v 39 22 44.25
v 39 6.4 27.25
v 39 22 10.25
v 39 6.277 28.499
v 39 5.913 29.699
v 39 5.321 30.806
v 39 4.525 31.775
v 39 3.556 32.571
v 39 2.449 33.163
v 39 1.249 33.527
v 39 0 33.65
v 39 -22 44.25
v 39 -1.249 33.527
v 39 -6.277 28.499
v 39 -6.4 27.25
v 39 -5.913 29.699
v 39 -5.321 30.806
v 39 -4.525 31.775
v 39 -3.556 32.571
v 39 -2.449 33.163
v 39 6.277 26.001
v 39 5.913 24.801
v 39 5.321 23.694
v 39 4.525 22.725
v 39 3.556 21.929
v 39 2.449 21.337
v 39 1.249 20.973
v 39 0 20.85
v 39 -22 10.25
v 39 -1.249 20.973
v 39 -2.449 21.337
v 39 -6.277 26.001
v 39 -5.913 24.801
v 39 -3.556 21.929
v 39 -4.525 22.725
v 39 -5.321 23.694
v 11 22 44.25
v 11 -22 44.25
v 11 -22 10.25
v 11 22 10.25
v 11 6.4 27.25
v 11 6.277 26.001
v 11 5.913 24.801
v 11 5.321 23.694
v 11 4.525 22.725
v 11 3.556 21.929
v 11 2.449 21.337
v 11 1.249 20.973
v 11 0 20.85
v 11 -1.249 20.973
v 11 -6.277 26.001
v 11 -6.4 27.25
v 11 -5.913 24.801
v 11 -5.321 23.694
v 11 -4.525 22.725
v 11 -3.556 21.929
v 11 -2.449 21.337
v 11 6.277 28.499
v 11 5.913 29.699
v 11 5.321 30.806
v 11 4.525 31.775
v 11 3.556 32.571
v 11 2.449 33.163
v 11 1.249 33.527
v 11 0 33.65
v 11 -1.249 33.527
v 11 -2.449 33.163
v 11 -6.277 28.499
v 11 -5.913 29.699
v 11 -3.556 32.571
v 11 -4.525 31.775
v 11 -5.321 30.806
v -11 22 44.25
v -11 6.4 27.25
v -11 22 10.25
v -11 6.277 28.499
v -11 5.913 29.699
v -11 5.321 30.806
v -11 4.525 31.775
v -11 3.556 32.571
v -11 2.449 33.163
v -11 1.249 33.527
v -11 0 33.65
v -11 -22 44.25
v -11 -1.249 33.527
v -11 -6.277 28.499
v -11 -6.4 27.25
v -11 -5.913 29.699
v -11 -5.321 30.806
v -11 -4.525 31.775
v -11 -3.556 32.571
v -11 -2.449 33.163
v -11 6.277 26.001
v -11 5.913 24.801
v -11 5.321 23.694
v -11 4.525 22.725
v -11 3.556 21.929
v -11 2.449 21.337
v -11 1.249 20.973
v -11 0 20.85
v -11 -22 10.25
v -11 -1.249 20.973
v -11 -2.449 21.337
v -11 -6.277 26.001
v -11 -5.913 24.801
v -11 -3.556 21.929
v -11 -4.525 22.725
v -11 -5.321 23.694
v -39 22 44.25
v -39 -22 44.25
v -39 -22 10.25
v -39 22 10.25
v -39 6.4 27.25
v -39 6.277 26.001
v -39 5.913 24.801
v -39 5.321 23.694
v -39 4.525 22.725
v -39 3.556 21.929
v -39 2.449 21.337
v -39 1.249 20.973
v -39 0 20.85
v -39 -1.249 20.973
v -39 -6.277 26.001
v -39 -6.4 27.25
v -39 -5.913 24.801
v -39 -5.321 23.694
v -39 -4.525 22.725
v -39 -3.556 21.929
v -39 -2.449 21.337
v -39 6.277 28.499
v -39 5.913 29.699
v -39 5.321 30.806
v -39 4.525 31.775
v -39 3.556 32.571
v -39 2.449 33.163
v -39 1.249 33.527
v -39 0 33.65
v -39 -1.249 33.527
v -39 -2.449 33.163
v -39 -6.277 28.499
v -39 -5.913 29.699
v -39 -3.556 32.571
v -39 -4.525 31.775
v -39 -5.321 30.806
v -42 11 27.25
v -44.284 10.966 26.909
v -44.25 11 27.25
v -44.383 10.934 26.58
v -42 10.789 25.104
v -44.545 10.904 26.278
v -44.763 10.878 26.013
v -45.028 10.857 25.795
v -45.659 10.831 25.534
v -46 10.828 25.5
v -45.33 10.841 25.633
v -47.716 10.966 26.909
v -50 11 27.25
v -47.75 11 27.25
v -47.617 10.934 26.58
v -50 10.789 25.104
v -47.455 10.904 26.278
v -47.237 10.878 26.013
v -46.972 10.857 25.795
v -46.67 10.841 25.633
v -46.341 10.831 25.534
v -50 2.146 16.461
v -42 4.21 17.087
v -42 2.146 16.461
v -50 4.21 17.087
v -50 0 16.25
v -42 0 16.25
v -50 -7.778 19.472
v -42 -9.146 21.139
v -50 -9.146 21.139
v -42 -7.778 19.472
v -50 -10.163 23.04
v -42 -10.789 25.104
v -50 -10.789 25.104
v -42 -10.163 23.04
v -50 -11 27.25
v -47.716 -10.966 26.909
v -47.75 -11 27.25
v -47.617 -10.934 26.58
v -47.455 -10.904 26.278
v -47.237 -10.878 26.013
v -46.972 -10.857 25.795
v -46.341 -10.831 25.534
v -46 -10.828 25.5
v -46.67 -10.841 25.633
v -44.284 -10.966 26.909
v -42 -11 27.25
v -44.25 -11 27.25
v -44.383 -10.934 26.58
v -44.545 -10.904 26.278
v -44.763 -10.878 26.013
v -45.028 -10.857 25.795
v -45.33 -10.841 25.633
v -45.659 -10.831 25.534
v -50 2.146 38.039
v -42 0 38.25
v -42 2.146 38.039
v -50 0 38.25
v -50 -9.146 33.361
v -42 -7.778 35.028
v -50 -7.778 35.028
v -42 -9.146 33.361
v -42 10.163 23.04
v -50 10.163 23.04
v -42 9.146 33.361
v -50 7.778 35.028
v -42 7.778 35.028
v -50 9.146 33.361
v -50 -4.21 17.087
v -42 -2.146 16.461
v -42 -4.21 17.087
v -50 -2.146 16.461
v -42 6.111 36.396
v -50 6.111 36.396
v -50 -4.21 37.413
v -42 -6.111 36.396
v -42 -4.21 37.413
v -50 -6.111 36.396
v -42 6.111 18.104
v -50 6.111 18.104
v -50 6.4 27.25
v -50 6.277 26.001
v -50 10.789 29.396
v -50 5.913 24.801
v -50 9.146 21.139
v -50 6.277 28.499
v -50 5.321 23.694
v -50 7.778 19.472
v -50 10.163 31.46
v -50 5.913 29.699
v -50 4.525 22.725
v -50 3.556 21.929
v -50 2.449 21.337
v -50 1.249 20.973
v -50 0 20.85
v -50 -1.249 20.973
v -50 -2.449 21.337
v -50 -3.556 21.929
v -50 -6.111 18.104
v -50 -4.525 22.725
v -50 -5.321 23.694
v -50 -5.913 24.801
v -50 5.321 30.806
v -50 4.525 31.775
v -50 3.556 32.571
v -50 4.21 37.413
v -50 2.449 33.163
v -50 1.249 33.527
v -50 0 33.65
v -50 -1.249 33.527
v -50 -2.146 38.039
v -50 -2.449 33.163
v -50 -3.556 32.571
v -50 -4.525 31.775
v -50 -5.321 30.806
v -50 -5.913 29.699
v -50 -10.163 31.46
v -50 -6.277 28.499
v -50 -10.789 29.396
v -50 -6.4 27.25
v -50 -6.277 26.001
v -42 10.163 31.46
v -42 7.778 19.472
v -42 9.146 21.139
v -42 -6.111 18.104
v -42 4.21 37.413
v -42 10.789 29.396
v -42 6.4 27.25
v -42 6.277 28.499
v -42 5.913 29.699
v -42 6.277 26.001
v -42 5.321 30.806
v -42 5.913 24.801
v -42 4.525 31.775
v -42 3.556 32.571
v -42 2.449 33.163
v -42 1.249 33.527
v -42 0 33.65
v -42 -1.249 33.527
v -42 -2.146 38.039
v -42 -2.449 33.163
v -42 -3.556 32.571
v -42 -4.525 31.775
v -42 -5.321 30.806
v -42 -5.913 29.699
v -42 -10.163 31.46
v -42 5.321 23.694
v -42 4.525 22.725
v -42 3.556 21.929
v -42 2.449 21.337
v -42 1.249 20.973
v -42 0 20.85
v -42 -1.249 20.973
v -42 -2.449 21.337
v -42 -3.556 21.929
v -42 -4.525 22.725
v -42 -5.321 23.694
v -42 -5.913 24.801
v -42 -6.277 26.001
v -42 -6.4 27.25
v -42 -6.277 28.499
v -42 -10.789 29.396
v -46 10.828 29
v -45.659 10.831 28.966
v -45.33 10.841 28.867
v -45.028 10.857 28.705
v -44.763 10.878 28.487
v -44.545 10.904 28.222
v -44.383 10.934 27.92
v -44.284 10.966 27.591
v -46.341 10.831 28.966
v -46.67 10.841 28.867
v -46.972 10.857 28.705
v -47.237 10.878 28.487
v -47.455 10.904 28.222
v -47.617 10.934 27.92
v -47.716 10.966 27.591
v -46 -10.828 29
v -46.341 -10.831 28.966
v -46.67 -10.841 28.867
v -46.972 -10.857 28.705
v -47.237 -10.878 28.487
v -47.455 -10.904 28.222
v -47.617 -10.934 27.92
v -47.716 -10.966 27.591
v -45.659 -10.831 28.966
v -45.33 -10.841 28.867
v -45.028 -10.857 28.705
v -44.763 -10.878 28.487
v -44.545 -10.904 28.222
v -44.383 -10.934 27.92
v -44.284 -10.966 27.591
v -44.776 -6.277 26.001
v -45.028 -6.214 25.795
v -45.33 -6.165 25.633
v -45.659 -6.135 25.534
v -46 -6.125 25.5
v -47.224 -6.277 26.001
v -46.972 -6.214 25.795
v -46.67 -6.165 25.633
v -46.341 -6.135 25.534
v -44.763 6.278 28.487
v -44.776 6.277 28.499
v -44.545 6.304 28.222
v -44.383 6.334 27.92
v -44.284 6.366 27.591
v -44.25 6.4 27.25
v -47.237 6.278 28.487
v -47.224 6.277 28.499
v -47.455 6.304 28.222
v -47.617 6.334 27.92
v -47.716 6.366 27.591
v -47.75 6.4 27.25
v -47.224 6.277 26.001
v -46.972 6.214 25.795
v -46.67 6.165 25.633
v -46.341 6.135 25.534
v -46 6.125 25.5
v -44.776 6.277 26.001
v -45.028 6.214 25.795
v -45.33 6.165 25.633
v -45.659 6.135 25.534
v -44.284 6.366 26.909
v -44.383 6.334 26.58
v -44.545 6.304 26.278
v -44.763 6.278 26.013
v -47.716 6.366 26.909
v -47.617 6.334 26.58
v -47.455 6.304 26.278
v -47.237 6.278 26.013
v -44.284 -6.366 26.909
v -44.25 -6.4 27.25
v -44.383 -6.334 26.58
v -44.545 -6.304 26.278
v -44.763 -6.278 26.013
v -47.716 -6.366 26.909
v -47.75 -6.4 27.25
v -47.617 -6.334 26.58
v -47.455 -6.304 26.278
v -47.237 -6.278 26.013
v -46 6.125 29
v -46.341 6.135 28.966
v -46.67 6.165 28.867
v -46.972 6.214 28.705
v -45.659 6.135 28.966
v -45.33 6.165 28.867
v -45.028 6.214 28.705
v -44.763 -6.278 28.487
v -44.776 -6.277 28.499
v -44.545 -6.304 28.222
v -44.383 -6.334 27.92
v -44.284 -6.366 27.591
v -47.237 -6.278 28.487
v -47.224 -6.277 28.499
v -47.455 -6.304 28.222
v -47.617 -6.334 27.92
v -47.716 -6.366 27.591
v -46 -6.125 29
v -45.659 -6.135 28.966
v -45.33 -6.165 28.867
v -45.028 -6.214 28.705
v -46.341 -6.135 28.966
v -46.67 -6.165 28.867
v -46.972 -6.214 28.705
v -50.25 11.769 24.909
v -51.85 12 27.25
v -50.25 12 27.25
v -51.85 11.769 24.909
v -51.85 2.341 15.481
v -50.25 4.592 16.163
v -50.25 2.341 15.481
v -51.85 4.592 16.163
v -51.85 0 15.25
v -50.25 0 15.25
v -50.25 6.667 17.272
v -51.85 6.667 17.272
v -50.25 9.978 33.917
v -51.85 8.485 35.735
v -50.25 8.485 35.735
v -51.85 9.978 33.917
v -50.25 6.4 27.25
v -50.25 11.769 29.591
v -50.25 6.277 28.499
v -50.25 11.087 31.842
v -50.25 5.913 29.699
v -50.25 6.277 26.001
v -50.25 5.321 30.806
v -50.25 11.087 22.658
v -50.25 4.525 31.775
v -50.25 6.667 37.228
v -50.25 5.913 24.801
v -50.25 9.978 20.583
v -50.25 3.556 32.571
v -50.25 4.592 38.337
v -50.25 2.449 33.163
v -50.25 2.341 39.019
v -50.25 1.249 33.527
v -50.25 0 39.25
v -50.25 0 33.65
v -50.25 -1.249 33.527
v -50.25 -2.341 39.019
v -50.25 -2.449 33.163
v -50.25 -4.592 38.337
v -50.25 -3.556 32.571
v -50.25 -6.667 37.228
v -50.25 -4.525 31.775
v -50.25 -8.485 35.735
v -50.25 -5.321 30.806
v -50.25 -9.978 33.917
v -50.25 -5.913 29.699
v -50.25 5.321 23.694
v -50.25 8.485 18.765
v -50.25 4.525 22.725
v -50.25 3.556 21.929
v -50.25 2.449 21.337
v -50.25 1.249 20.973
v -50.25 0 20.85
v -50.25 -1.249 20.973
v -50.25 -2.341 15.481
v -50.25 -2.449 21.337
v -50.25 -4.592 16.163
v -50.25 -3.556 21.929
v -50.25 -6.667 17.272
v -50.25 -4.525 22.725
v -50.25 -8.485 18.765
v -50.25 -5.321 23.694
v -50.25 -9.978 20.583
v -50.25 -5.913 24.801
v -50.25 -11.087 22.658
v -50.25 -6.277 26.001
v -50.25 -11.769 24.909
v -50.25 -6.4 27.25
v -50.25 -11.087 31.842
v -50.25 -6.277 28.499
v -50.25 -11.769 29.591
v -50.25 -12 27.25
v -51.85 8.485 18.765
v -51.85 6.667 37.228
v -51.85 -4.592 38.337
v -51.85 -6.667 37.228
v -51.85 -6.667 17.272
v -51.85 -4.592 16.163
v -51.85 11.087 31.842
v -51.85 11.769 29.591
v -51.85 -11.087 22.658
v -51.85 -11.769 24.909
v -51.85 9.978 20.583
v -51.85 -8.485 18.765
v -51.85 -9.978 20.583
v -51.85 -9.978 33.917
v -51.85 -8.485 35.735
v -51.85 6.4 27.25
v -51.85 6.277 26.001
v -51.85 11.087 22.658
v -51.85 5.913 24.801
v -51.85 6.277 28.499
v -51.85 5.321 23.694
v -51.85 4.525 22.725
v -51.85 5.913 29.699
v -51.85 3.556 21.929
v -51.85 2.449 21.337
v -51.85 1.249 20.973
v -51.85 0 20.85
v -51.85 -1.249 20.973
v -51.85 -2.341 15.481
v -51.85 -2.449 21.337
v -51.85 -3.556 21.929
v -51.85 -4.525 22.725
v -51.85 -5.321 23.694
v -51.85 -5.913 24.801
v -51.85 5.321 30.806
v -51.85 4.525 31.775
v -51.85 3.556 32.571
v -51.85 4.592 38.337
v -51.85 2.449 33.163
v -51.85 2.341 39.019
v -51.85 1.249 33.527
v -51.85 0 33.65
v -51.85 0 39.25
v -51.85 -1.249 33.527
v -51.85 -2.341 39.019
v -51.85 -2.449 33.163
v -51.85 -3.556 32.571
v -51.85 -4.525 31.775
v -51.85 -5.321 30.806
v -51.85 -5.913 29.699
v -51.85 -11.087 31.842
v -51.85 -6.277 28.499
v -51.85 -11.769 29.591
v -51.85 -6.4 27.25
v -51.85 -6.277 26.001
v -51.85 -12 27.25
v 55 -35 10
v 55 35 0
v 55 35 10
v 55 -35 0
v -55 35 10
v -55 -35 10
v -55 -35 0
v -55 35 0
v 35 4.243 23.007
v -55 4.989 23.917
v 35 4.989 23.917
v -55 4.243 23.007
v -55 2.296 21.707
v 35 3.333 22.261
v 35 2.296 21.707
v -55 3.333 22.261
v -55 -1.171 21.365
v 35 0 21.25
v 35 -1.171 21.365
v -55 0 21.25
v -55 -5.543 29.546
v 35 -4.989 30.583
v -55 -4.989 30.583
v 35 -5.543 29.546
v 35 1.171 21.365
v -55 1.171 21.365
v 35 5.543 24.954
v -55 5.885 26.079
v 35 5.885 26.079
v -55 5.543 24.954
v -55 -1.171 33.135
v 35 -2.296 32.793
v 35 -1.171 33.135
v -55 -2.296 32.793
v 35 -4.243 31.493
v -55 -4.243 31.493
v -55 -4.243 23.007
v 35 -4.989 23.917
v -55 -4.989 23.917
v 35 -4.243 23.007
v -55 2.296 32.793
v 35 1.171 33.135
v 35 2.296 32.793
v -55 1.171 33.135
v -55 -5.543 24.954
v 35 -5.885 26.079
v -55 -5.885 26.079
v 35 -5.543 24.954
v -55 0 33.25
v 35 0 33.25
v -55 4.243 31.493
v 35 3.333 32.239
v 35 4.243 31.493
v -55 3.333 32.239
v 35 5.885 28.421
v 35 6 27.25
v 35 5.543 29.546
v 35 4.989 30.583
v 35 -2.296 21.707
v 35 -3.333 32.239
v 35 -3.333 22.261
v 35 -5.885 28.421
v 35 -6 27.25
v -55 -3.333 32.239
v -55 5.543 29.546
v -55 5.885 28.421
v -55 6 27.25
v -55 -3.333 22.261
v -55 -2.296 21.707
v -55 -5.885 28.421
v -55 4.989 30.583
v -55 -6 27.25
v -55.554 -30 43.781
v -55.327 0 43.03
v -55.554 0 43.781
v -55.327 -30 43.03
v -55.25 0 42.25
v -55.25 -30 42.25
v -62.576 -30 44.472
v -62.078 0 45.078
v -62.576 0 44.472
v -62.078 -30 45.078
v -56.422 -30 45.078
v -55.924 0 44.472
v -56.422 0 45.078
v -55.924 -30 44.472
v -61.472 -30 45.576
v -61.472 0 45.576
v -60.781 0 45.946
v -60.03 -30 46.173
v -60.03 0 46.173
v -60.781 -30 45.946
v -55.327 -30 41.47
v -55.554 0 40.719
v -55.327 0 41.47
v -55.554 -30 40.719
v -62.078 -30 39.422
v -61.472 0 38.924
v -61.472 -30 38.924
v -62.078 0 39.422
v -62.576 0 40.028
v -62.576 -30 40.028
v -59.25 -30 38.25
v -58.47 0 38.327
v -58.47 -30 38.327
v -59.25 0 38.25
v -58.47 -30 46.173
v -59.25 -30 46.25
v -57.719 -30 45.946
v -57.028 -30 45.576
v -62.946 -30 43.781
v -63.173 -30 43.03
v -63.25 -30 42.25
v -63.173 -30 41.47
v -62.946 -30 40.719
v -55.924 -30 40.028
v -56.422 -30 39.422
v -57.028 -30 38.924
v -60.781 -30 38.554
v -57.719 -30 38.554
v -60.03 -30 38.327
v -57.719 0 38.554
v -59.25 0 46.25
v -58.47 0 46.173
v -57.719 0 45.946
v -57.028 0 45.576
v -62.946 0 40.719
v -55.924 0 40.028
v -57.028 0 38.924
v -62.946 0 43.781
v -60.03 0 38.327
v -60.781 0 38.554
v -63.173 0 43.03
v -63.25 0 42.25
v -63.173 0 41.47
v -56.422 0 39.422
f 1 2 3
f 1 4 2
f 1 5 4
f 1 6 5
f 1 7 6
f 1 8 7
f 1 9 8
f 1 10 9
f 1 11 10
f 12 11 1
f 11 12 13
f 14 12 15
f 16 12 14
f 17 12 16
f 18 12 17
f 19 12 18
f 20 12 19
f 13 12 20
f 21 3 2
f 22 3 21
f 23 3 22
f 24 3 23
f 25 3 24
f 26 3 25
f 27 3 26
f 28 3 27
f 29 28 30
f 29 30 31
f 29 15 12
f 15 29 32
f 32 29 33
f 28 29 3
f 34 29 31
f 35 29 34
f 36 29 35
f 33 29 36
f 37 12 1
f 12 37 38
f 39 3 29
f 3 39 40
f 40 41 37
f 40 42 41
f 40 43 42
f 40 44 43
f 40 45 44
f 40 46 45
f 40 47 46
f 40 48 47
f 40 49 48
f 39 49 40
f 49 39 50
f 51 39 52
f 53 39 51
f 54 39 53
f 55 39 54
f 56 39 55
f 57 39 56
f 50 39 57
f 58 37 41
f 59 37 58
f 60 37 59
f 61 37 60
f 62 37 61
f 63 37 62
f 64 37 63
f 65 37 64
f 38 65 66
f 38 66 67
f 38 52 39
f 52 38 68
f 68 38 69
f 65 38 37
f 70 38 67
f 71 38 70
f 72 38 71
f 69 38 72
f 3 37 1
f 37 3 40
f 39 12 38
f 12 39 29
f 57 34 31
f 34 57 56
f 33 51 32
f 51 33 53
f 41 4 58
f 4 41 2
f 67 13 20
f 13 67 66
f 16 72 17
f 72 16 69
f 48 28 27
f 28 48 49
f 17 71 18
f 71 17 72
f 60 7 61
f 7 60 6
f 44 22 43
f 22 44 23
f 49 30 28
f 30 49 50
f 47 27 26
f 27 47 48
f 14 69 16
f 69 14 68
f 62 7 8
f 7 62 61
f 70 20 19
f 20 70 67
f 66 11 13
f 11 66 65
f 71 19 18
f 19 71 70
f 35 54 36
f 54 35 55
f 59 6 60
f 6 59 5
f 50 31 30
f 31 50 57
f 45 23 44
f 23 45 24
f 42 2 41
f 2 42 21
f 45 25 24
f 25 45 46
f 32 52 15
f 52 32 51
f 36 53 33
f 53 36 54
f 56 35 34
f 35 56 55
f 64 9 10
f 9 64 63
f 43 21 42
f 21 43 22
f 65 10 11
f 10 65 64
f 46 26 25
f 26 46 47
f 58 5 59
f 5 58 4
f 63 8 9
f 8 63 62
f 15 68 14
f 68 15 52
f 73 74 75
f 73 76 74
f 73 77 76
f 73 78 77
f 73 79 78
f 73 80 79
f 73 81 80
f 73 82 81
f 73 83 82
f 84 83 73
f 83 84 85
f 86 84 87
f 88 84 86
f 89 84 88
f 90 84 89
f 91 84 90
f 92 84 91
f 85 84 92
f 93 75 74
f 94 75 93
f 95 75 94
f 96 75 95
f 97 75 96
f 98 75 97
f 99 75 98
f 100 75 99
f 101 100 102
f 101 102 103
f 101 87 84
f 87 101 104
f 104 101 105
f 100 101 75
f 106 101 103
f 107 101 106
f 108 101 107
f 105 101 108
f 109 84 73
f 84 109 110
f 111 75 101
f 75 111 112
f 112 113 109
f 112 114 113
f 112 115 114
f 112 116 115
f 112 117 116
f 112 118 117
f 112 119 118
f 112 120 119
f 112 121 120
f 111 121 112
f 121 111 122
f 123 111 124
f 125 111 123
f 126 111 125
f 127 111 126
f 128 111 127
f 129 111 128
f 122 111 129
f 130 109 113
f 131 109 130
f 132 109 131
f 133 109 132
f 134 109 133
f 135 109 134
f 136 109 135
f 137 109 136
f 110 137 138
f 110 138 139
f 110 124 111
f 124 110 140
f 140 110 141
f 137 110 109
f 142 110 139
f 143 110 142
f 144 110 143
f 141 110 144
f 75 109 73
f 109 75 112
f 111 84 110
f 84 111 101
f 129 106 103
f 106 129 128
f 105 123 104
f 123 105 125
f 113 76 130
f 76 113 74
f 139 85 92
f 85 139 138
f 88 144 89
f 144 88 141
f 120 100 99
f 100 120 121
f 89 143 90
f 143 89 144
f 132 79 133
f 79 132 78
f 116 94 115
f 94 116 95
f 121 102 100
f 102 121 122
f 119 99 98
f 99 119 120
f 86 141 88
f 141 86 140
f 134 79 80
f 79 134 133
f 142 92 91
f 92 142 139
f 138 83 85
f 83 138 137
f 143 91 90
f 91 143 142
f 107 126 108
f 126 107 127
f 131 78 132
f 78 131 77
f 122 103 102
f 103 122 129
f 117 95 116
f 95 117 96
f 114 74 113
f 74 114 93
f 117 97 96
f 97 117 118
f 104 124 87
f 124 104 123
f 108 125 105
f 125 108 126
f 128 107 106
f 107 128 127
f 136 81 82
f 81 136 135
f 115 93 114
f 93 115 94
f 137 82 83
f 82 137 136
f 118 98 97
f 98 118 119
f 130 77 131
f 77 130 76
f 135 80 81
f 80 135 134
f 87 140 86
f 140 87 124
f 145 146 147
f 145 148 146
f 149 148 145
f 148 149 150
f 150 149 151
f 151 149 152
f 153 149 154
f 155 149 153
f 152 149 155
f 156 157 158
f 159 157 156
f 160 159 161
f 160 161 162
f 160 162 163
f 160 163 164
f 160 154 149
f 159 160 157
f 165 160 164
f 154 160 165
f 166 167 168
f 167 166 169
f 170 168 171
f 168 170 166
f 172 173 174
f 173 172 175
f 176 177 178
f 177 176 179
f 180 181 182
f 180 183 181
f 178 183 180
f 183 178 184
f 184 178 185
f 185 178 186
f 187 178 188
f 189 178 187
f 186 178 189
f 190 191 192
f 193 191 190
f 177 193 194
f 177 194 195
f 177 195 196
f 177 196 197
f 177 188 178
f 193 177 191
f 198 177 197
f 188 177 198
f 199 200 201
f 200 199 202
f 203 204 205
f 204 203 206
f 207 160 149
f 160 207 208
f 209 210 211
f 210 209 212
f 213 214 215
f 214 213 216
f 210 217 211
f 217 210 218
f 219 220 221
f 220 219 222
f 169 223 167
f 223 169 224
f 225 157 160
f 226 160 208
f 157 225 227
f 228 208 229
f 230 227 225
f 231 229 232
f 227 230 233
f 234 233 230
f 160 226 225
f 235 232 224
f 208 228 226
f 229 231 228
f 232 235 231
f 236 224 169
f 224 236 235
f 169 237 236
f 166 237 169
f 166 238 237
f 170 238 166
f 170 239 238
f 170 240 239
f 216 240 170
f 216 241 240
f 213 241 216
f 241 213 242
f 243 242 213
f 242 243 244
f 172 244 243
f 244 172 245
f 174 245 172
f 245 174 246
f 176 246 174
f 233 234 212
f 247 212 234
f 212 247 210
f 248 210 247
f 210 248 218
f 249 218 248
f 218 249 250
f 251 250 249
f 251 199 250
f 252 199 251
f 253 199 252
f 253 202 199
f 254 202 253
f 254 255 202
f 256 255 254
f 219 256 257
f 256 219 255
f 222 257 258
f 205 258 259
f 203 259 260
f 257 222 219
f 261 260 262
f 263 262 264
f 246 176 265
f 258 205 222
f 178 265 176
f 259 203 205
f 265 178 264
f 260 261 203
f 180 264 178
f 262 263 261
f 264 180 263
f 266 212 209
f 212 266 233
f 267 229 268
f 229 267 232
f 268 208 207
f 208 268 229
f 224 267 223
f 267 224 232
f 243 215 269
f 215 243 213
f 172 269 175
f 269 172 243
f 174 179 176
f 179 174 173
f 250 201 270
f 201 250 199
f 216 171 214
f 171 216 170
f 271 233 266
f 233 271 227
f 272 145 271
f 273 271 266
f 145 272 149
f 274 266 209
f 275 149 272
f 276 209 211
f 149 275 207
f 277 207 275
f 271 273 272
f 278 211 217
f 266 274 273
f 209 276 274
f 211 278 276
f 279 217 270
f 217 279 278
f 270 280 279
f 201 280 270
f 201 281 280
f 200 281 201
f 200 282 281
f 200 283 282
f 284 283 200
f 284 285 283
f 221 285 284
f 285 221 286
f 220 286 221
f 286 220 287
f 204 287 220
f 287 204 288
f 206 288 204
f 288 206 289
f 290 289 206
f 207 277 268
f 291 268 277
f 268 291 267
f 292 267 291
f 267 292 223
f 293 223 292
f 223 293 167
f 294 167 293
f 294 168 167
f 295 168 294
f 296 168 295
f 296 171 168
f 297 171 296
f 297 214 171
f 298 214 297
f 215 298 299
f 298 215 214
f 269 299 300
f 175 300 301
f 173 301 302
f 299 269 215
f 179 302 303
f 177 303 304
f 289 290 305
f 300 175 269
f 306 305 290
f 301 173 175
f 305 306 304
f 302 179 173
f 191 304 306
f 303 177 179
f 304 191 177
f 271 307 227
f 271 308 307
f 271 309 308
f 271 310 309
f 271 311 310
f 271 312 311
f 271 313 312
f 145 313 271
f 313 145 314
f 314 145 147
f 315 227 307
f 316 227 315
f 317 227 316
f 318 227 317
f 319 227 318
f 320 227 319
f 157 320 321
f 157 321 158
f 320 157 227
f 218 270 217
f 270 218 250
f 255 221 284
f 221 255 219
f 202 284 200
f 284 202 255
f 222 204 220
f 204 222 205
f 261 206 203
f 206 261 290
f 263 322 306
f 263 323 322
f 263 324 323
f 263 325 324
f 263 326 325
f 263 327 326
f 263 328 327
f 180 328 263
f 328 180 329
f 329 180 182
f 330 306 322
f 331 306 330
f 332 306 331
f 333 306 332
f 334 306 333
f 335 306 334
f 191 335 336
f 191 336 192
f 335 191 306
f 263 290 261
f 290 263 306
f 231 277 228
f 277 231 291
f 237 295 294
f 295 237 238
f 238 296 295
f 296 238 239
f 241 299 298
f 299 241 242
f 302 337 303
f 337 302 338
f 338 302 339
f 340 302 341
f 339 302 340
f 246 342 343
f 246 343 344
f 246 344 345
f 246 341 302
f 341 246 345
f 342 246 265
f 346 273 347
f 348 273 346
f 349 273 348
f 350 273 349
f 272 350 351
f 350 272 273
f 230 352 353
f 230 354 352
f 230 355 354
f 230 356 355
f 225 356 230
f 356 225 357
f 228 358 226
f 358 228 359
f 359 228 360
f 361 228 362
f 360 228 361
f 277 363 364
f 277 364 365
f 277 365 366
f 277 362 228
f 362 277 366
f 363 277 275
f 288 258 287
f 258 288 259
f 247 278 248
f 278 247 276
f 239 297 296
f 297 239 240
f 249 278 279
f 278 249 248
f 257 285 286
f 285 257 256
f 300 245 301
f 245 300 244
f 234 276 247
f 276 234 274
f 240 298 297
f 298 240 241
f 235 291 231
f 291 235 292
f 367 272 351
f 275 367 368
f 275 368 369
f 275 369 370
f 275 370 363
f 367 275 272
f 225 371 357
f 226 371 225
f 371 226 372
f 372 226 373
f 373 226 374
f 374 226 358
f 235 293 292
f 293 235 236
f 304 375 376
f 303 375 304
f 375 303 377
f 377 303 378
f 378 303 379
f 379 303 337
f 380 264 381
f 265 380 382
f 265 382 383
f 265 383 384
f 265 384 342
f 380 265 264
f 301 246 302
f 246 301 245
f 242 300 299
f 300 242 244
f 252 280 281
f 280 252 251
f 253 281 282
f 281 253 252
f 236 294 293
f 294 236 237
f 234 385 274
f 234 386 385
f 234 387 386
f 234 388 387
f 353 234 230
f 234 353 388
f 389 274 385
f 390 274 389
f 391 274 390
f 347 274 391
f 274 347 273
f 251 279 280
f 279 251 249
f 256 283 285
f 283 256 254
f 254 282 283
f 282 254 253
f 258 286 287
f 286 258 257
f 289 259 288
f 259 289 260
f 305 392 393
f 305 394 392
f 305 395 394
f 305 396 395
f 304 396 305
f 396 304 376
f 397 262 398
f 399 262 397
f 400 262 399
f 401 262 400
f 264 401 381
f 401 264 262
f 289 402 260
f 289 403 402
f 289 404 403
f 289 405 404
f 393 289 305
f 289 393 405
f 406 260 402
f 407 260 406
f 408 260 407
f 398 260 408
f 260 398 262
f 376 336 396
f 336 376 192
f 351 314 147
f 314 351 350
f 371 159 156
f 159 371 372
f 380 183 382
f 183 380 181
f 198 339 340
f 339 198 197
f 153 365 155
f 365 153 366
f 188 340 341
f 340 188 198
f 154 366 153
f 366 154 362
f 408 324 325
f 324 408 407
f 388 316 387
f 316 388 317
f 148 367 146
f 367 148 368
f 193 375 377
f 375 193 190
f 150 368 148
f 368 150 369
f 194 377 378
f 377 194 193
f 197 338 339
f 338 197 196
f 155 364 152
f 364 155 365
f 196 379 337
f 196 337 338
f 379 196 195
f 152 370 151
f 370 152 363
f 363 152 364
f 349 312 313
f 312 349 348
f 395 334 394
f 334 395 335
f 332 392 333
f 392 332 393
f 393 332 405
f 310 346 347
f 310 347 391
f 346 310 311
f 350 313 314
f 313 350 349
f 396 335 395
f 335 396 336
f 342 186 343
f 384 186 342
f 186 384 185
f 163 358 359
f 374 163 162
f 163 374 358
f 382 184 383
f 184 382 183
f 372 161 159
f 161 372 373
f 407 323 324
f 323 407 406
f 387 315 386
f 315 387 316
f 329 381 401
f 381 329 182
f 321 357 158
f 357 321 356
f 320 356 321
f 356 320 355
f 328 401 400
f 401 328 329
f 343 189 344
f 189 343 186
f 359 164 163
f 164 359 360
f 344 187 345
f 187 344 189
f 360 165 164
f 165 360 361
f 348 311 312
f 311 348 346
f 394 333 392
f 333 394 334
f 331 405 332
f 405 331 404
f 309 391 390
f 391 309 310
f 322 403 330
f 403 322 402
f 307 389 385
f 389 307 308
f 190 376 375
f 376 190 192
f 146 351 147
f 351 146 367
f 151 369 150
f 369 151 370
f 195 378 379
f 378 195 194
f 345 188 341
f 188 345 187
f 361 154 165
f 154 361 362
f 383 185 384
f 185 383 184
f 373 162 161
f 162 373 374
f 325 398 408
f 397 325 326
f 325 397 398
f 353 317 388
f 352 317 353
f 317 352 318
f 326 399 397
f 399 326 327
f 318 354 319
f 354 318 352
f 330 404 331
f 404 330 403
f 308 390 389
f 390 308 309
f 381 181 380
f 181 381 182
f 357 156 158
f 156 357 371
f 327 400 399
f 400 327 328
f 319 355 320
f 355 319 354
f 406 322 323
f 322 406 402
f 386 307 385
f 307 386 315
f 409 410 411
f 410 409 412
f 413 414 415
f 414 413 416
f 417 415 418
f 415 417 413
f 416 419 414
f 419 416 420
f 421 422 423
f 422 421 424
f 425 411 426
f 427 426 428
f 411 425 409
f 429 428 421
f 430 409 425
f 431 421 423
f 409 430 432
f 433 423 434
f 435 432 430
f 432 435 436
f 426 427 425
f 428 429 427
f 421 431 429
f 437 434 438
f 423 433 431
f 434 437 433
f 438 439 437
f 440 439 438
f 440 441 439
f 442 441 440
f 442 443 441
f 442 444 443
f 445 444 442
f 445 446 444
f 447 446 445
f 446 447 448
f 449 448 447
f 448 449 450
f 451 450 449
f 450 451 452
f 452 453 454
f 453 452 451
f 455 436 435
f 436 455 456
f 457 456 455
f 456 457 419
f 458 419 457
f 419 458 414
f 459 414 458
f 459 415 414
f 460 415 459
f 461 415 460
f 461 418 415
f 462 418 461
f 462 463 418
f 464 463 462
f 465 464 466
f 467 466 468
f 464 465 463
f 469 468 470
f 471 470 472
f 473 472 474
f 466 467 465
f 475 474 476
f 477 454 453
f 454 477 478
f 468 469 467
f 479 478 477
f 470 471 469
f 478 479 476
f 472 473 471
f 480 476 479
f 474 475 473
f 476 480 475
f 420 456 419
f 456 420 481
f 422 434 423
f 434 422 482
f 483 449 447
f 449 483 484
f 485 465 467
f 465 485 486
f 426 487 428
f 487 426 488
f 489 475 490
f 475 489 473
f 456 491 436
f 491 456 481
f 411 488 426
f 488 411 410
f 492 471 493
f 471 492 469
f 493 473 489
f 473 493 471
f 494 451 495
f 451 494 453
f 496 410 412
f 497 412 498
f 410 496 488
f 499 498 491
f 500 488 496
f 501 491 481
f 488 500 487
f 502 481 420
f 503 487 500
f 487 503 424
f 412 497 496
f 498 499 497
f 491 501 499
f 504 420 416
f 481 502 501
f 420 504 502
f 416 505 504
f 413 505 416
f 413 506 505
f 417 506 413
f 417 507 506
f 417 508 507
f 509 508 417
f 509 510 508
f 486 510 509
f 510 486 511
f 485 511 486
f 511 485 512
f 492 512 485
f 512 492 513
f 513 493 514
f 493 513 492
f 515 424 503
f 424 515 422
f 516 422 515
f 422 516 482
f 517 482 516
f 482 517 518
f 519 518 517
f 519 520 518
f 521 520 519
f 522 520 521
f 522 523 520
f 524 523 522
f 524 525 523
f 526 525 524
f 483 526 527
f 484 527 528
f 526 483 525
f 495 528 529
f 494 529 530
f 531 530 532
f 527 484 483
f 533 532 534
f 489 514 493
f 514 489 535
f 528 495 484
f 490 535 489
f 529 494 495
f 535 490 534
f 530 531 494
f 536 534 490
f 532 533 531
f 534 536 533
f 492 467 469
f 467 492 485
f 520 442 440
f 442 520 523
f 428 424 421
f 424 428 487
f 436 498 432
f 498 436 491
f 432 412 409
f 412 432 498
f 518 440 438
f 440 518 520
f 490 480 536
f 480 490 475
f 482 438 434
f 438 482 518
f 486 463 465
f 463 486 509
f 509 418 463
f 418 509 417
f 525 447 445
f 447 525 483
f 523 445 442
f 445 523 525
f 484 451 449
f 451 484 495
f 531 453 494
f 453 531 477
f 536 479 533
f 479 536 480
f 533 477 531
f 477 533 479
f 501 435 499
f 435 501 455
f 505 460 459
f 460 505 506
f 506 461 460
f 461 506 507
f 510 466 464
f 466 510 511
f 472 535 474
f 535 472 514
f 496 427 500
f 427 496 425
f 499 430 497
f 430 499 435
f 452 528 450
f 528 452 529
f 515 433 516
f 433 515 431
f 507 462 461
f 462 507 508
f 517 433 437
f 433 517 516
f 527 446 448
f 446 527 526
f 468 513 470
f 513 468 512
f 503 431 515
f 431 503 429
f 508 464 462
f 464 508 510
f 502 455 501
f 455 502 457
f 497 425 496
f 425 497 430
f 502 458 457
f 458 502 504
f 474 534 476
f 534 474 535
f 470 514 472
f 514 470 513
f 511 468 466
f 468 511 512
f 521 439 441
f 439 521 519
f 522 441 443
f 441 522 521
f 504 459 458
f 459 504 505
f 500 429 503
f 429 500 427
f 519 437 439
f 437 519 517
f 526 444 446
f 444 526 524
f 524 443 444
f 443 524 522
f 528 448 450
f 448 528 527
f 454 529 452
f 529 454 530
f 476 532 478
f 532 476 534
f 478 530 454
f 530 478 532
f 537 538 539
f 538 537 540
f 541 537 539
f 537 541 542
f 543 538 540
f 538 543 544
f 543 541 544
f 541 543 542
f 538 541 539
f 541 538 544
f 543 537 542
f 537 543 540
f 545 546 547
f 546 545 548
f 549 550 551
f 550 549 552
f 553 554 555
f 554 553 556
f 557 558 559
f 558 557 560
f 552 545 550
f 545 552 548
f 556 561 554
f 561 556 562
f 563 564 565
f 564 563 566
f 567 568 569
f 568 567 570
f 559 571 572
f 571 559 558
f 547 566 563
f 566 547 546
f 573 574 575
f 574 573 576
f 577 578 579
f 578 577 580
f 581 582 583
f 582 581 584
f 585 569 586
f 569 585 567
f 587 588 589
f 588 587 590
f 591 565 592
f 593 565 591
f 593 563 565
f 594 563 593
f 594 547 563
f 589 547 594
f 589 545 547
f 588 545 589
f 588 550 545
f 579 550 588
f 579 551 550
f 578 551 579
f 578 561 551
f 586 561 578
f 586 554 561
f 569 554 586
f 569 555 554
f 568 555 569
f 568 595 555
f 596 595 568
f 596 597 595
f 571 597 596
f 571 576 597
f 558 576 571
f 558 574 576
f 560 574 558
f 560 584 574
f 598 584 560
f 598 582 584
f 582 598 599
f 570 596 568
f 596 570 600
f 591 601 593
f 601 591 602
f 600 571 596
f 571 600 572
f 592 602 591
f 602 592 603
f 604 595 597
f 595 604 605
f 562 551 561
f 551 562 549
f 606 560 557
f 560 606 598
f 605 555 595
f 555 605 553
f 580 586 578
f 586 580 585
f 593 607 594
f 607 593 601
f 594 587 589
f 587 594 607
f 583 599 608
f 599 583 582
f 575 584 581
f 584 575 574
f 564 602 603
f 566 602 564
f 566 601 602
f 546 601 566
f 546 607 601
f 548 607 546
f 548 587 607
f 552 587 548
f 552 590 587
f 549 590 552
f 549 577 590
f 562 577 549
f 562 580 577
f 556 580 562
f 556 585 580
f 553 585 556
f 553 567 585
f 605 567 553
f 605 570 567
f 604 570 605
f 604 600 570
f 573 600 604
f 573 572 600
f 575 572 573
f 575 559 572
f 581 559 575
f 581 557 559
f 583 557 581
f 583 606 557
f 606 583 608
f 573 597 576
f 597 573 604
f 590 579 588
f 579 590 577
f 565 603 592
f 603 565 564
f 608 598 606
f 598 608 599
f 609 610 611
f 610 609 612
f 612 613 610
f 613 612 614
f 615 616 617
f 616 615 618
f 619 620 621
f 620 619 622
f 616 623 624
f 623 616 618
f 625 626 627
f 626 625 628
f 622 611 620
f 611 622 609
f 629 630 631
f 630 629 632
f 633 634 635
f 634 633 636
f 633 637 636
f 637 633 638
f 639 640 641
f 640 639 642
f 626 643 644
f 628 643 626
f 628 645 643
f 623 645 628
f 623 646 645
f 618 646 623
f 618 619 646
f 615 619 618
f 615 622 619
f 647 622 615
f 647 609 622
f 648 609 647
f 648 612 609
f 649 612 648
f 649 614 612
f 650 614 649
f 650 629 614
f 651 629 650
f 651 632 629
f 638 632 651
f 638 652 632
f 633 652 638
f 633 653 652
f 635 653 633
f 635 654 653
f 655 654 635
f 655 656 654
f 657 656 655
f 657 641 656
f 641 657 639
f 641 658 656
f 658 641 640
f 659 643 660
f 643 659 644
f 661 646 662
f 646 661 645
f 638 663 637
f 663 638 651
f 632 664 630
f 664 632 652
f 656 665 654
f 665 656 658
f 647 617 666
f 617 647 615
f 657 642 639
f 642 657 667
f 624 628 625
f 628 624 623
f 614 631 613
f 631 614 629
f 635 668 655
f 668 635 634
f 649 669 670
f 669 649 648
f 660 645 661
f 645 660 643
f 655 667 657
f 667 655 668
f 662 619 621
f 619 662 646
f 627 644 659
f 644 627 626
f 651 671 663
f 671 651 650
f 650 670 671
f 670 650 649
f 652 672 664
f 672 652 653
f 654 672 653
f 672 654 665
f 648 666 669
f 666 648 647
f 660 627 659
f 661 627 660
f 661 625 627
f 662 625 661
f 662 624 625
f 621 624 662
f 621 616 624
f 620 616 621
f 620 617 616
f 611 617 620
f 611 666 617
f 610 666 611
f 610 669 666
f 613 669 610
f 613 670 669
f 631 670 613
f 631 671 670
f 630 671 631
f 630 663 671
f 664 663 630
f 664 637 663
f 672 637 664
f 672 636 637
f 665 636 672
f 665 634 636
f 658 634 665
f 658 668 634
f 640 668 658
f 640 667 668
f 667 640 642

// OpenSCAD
$fn = 32;

// ------------------------------------------------------------------------
// Machine vise: screw d12, jaws 28 x 34 mm
// Every part is its own module, assembly() places every instance.
// ------------------------------------------------------------------------

// --- part 1 ---
module vise_bed() {
  difference() {
    translate([-55, -35, 0]) cube([110, 70, 10]);
  }
}

// --- part 2 ---
module vise_jaw() {
  difference() {
    translate([-14, -22, 0]) cube([28, 44, 34]);
    translate([0, 0, 17]) rotate([0, 90, 0]) cylinder(h = 30, d = 12.8, center = true);
  }
}

// --- part 3 ---
module vise_screw() {
  translate([0, 0, -45]) cylinder(h = 90, d = 12);
}

// --- part 4 ---
module screw_collar() {
  difference() {
    cylinder(h = 8, d = 22);
    translate([0, 0, -1]) cylinder(h = 10, d = 12.8);
    translate([0, 0, 4]) rotate([90, 0, 0]) cylinder(h = 24, d = 3.5, center = true);
  }
}

// --- part 5 ---
module screw_washer() {
  difference() {
      translate([0, 0, 0]) cylinder(h = 1.6, d = 24);
      translate([0, 0, -1]) cylinder(h = 3.6, d = 12.8);
    }
}

// --- part 6 ---
module vise_handle() {
  cylinder(h = 30, d = 8);
}

// --- assembly ---
module assembly() {
  color([0.80, 0.24, 0.20]) translate([0, 0, 0]) rotate([0, 0, 0]) vise_bed();
  color([0.20, 0.45, 0.75]) translate([25, 0, 10.25]) rotate([0, 0, 0]) vise_jaw();
  color([0.25, 0.62, 0.32]) translate([-25, 0, 10.25]) rotate([0, 0, 0]) vise_jaw();
  color([0.92, 0.70, 0.18]) translate([-10, 0, 27.25]) rotate([0, 90, 0]) vise_screw();
  color([0.58, 0.35, 0.70]) translate([-50, 0, 27.25]) rotate([0, 90, 0]) screw_collar();
  color([0.16, 0.66, 0.66]) translate([-51.85, 0, 27.25]) rotate([0, 90, 0]) screw_washer();
  color([0.85, 0.48, 0.18]) translate([-59.25, 0, 42.25]) rotate([90, 0, 0]) vise_handle();
}

assembly();
